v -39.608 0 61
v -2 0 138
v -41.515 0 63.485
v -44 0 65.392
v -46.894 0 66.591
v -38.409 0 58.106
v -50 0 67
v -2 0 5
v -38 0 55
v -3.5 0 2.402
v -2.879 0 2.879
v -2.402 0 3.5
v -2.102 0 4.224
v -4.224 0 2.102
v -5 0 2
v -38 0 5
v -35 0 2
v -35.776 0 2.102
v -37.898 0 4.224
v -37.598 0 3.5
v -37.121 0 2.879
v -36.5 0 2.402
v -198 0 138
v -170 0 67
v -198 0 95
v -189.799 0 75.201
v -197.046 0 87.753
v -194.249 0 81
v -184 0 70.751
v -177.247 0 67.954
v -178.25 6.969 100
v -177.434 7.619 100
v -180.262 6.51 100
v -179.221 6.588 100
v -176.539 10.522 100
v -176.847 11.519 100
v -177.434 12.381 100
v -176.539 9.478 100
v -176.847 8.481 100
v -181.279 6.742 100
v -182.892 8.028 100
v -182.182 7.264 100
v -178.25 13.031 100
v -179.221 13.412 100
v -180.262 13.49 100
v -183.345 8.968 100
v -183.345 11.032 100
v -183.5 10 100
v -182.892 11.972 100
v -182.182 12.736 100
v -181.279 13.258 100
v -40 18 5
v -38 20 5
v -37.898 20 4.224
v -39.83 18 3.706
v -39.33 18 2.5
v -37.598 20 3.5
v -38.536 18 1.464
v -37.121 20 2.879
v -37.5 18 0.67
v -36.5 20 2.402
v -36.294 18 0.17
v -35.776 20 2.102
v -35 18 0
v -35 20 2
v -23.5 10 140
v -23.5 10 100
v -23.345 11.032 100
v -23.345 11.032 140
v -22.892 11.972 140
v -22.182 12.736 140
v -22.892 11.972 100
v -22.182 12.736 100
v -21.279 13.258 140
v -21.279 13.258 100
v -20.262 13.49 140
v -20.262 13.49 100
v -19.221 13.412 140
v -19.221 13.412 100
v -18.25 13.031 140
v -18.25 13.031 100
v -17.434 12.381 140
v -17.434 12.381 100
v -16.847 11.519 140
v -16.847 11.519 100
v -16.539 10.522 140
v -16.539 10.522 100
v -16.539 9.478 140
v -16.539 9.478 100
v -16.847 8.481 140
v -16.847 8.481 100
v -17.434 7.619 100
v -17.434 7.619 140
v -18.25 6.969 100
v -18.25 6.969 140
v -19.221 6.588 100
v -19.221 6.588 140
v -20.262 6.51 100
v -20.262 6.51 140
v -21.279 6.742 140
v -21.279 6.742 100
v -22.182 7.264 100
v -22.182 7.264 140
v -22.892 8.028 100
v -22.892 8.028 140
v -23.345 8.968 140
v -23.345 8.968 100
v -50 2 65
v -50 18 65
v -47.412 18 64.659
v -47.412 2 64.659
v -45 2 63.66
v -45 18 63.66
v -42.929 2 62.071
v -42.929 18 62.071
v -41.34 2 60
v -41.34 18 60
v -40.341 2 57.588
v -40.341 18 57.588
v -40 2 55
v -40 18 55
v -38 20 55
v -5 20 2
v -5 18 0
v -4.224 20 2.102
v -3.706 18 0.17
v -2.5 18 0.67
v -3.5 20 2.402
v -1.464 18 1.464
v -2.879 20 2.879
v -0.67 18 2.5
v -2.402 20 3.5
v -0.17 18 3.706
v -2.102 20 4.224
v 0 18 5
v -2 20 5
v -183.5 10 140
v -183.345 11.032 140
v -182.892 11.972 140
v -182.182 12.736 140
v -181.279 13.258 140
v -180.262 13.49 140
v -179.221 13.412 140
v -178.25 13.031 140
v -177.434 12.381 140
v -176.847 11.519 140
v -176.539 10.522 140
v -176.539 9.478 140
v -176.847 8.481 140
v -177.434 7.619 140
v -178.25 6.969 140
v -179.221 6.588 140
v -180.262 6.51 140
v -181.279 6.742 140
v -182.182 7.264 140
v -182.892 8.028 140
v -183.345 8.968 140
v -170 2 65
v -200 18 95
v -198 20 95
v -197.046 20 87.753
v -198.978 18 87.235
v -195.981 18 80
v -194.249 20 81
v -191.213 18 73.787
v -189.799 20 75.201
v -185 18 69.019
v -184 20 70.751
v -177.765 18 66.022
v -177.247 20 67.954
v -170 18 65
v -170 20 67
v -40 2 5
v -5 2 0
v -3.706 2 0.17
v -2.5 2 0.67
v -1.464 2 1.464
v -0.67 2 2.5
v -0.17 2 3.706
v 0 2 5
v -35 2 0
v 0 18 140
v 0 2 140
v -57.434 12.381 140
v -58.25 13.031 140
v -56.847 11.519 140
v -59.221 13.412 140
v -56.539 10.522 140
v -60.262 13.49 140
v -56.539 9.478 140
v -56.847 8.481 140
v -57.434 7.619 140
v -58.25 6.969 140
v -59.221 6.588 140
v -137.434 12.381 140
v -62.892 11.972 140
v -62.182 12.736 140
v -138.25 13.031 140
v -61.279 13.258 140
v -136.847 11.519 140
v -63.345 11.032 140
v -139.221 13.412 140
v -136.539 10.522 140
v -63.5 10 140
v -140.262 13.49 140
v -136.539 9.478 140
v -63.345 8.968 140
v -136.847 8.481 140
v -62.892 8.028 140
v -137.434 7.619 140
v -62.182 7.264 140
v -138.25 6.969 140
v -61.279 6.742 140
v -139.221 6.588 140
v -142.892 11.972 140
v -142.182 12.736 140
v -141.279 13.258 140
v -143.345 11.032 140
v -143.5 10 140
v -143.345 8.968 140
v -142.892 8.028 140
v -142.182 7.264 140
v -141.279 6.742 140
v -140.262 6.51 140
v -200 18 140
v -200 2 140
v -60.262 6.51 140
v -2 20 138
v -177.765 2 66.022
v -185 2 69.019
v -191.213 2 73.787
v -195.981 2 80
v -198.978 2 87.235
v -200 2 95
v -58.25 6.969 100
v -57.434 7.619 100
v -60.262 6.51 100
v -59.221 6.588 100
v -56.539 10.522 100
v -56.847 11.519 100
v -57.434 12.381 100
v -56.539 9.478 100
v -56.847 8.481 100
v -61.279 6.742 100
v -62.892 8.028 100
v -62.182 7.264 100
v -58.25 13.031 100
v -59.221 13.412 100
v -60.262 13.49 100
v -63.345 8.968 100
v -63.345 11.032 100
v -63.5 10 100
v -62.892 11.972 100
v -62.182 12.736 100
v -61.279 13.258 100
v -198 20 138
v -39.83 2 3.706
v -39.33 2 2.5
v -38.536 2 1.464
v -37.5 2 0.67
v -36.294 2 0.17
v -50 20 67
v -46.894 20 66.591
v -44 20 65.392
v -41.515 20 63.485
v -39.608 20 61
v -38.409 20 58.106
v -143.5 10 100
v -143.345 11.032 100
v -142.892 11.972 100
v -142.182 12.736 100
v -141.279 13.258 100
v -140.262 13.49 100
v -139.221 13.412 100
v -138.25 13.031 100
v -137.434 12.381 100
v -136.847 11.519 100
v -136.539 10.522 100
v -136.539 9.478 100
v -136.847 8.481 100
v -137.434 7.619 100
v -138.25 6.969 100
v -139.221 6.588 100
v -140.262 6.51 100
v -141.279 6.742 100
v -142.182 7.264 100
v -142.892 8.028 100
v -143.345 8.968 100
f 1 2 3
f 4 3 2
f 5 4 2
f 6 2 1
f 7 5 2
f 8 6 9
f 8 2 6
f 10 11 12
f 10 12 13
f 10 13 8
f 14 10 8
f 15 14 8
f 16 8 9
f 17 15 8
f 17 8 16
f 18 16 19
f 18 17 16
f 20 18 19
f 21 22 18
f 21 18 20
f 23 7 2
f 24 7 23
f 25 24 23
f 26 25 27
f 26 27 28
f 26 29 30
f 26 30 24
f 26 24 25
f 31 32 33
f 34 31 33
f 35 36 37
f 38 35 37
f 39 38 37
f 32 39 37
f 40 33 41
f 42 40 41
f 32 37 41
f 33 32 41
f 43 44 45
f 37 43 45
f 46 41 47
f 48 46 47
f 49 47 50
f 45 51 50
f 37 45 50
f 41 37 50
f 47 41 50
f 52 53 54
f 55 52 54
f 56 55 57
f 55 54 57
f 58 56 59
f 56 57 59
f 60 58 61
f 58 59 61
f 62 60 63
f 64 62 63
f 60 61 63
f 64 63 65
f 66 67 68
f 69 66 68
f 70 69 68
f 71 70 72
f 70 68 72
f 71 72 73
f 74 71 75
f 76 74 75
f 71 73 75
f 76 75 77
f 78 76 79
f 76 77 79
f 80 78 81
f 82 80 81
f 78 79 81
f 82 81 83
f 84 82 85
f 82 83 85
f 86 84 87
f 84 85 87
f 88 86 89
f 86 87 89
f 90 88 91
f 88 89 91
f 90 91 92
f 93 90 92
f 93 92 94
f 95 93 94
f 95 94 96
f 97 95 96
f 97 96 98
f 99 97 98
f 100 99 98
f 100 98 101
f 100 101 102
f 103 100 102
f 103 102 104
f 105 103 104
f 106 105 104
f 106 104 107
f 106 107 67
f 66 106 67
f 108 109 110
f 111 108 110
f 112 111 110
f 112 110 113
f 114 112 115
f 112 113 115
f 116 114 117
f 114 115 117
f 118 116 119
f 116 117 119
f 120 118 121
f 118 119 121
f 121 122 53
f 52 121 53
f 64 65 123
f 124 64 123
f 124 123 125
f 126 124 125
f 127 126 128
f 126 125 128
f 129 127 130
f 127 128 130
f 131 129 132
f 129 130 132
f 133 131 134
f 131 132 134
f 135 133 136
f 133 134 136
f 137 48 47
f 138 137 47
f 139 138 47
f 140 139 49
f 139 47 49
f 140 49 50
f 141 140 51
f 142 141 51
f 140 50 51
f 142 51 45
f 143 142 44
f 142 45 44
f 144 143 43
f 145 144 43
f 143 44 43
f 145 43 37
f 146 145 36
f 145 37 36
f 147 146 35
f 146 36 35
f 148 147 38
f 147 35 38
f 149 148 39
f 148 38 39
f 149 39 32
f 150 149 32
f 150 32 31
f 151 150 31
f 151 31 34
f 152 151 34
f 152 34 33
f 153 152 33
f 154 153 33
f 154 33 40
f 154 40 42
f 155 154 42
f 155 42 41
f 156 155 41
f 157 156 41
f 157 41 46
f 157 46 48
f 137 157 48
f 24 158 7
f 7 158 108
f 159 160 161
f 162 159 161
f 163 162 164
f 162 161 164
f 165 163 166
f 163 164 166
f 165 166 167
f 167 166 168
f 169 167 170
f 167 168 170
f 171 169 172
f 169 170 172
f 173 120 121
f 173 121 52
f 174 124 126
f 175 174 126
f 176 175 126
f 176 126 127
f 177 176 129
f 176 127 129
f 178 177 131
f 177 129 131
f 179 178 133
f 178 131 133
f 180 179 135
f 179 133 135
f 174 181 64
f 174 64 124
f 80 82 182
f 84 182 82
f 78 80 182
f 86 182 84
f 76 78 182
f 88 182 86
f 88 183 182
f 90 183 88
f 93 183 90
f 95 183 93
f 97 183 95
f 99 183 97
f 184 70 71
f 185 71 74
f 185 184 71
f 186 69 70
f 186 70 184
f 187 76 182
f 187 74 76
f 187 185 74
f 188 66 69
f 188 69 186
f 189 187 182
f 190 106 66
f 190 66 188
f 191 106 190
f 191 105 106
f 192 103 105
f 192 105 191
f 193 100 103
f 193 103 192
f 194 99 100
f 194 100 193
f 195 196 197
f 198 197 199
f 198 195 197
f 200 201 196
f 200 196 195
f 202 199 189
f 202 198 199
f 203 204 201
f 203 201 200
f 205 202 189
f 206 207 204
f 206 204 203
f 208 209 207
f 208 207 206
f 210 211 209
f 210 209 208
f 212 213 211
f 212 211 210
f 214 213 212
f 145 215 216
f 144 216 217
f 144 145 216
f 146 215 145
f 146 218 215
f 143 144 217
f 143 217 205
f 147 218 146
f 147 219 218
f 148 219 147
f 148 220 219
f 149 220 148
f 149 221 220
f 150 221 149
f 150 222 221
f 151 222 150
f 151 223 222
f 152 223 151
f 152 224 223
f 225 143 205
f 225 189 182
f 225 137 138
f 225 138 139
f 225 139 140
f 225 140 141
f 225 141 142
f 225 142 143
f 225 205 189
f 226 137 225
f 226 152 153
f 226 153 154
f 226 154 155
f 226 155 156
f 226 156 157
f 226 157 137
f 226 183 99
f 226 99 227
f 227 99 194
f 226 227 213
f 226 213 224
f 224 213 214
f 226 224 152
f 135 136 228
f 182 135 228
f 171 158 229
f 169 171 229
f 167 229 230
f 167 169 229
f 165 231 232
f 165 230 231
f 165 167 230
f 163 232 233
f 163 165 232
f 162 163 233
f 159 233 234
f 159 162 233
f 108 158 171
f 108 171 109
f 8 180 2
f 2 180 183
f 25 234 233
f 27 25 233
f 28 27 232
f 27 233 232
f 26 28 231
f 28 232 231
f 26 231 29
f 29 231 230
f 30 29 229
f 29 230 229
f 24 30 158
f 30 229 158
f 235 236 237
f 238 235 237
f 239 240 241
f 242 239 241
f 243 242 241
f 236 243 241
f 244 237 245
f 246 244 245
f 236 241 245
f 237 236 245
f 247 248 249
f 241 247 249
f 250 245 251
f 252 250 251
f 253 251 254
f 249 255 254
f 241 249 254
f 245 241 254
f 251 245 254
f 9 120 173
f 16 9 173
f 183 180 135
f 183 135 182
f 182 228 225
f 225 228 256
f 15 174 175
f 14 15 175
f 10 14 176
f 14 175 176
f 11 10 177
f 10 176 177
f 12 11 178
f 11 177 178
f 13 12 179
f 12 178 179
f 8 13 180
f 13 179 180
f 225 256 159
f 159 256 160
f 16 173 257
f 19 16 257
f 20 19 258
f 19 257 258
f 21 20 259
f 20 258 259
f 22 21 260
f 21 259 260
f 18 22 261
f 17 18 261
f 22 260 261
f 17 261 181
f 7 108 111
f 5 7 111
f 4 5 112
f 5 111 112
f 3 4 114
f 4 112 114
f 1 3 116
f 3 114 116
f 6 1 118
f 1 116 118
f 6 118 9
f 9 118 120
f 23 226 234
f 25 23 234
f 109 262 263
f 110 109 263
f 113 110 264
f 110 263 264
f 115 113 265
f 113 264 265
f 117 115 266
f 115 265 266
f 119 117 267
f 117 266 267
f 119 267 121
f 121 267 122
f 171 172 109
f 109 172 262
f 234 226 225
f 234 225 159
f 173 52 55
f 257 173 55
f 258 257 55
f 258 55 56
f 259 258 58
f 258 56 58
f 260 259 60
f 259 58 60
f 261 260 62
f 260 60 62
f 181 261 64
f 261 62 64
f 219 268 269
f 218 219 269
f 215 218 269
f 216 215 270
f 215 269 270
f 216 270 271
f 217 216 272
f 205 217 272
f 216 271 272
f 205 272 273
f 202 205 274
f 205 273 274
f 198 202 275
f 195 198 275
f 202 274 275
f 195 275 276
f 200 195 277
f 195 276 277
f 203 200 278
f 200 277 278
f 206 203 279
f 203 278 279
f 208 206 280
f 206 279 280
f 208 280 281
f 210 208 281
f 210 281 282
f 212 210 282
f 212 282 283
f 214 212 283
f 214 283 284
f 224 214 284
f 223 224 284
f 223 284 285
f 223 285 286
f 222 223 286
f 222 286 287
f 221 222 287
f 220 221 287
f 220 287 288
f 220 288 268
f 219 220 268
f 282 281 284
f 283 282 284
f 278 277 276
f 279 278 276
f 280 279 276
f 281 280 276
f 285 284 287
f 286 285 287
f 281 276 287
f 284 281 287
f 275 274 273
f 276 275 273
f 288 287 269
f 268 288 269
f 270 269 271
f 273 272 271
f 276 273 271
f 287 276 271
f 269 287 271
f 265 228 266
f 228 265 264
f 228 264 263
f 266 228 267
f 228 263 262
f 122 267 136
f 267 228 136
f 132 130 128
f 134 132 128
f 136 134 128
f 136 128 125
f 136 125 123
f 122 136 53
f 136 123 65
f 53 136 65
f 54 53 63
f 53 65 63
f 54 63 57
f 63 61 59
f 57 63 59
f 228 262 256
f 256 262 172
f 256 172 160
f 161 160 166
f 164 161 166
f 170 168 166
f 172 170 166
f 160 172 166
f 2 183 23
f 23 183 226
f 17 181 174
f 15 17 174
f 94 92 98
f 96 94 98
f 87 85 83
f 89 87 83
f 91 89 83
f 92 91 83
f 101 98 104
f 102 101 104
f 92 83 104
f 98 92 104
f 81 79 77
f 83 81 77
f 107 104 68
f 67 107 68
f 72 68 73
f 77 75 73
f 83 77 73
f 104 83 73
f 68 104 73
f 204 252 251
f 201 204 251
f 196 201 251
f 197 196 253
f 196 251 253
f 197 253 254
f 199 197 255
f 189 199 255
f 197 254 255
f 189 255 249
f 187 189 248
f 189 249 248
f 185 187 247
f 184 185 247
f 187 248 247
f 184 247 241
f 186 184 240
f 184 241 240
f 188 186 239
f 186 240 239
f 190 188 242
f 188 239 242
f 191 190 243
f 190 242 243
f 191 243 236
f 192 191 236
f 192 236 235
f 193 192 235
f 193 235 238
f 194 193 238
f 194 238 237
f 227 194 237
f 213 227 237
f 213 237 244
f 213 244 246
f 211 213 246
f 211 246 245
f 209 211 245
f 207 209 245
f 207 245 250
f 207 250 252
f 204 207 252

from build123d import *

# Parameters (mm, degrees)
BOSS_EXTRUDE1_DEPTH      = 20
FILLET1_R                = 10
M6_CLEARANCE_HOLE1_D     = 7
M6_CLEARANCE_HOLE1_DEPTH = 40
FILLET2_R                = 5
FILLET3_R                = 30
CHAMFER1_SIZE            = 2


with BuildPart() as part:
    # Sketch1 → Boss-Extrude1 (new body)
    with BuildSketch(Plane(origin=(0, 0, 0), x_dir=(1, 0, 0), z_dir=(0, 1, 0))):
        Polygon((0, 0), (0, -140), (-200, -140), (-200, -65), (-40, -65), (-40, 0), align=None)
    extrude(amount=BOSS_EXTRUDE1_DEPTH)

    # Fillet1
    fillet1_edges = [part.edges().sort_by_distance(p)[0] for p in [
        (-40, 10, 65),
    ]]
    fillet(fillet1_edges, radius=FILLET1_R)

    # M6 Clearance Hole1
    with Locations(Plane(origin=(10895.274804619, -492.997703293, 140), x_dir=(1, 0, 0), z_dir=(0, 0, 1))):
        with Locations((-11075.274804618, 502.997703293), (-11035.274804618, 502.997703293), (-10955.274804618, 502.997703293), (-10915.274804618, 502.997703293)):
            Hole(M6_CLEARANCE_HOLE1_D / 2, depth=M6_CLEARANCE_HOLE1_DEPTH)

    # Fillet2
    fillet2_edges = [part.edges().sort_by_distance(p)[0] for p in [
        (0, 10, 0),
        (-40, 10, 0),
    ]]
    fillet(fillet2_edges, radius=FILLET2_R)

    # Fillet3
    fillet3_edges = [part.edges().sort_by_distance(p)[0] for p in [
        (-200, 10, 65),
    ]]
    fillet(fillet3_edges, radius=FILLET3_R)

    # Chamfer1
    chamfer1_edges = [part.edges().sort_by_distance(p)[0] for p in [
        (-110, 0, 65),
        (-110, 20, 65),
        (-100, 20, 140),
        (-42.928932188, 0, 62.071067812),
        (-42.928932188, 20, 62.071067812),
        (0, 20, 72.5),
        (-20, 0, 0),
        (-20, 20, 0),
        (-40, 0, 30),
        (-38.535533906, 0, 1.464466094),
        (-1.464466094, 0, 1.464466094),
        (-40, 20, 30),
        (-38.535533906, 20, 1.464466094),
        (-1.464466094, 20, 1.464466094),
        (-200, 0, 117.5),
        (-200, 20, 117.5),
        (-191.213203436, 0, 73.786796564),
        (-191.213203436, 20, 73.786796564),
        (0, 0, 72.5),
        (-100, 0, 140),
    ]]
    chamfer(chamfer1_edges, length=CHAMFER1_SIZE)


solid = part.part
